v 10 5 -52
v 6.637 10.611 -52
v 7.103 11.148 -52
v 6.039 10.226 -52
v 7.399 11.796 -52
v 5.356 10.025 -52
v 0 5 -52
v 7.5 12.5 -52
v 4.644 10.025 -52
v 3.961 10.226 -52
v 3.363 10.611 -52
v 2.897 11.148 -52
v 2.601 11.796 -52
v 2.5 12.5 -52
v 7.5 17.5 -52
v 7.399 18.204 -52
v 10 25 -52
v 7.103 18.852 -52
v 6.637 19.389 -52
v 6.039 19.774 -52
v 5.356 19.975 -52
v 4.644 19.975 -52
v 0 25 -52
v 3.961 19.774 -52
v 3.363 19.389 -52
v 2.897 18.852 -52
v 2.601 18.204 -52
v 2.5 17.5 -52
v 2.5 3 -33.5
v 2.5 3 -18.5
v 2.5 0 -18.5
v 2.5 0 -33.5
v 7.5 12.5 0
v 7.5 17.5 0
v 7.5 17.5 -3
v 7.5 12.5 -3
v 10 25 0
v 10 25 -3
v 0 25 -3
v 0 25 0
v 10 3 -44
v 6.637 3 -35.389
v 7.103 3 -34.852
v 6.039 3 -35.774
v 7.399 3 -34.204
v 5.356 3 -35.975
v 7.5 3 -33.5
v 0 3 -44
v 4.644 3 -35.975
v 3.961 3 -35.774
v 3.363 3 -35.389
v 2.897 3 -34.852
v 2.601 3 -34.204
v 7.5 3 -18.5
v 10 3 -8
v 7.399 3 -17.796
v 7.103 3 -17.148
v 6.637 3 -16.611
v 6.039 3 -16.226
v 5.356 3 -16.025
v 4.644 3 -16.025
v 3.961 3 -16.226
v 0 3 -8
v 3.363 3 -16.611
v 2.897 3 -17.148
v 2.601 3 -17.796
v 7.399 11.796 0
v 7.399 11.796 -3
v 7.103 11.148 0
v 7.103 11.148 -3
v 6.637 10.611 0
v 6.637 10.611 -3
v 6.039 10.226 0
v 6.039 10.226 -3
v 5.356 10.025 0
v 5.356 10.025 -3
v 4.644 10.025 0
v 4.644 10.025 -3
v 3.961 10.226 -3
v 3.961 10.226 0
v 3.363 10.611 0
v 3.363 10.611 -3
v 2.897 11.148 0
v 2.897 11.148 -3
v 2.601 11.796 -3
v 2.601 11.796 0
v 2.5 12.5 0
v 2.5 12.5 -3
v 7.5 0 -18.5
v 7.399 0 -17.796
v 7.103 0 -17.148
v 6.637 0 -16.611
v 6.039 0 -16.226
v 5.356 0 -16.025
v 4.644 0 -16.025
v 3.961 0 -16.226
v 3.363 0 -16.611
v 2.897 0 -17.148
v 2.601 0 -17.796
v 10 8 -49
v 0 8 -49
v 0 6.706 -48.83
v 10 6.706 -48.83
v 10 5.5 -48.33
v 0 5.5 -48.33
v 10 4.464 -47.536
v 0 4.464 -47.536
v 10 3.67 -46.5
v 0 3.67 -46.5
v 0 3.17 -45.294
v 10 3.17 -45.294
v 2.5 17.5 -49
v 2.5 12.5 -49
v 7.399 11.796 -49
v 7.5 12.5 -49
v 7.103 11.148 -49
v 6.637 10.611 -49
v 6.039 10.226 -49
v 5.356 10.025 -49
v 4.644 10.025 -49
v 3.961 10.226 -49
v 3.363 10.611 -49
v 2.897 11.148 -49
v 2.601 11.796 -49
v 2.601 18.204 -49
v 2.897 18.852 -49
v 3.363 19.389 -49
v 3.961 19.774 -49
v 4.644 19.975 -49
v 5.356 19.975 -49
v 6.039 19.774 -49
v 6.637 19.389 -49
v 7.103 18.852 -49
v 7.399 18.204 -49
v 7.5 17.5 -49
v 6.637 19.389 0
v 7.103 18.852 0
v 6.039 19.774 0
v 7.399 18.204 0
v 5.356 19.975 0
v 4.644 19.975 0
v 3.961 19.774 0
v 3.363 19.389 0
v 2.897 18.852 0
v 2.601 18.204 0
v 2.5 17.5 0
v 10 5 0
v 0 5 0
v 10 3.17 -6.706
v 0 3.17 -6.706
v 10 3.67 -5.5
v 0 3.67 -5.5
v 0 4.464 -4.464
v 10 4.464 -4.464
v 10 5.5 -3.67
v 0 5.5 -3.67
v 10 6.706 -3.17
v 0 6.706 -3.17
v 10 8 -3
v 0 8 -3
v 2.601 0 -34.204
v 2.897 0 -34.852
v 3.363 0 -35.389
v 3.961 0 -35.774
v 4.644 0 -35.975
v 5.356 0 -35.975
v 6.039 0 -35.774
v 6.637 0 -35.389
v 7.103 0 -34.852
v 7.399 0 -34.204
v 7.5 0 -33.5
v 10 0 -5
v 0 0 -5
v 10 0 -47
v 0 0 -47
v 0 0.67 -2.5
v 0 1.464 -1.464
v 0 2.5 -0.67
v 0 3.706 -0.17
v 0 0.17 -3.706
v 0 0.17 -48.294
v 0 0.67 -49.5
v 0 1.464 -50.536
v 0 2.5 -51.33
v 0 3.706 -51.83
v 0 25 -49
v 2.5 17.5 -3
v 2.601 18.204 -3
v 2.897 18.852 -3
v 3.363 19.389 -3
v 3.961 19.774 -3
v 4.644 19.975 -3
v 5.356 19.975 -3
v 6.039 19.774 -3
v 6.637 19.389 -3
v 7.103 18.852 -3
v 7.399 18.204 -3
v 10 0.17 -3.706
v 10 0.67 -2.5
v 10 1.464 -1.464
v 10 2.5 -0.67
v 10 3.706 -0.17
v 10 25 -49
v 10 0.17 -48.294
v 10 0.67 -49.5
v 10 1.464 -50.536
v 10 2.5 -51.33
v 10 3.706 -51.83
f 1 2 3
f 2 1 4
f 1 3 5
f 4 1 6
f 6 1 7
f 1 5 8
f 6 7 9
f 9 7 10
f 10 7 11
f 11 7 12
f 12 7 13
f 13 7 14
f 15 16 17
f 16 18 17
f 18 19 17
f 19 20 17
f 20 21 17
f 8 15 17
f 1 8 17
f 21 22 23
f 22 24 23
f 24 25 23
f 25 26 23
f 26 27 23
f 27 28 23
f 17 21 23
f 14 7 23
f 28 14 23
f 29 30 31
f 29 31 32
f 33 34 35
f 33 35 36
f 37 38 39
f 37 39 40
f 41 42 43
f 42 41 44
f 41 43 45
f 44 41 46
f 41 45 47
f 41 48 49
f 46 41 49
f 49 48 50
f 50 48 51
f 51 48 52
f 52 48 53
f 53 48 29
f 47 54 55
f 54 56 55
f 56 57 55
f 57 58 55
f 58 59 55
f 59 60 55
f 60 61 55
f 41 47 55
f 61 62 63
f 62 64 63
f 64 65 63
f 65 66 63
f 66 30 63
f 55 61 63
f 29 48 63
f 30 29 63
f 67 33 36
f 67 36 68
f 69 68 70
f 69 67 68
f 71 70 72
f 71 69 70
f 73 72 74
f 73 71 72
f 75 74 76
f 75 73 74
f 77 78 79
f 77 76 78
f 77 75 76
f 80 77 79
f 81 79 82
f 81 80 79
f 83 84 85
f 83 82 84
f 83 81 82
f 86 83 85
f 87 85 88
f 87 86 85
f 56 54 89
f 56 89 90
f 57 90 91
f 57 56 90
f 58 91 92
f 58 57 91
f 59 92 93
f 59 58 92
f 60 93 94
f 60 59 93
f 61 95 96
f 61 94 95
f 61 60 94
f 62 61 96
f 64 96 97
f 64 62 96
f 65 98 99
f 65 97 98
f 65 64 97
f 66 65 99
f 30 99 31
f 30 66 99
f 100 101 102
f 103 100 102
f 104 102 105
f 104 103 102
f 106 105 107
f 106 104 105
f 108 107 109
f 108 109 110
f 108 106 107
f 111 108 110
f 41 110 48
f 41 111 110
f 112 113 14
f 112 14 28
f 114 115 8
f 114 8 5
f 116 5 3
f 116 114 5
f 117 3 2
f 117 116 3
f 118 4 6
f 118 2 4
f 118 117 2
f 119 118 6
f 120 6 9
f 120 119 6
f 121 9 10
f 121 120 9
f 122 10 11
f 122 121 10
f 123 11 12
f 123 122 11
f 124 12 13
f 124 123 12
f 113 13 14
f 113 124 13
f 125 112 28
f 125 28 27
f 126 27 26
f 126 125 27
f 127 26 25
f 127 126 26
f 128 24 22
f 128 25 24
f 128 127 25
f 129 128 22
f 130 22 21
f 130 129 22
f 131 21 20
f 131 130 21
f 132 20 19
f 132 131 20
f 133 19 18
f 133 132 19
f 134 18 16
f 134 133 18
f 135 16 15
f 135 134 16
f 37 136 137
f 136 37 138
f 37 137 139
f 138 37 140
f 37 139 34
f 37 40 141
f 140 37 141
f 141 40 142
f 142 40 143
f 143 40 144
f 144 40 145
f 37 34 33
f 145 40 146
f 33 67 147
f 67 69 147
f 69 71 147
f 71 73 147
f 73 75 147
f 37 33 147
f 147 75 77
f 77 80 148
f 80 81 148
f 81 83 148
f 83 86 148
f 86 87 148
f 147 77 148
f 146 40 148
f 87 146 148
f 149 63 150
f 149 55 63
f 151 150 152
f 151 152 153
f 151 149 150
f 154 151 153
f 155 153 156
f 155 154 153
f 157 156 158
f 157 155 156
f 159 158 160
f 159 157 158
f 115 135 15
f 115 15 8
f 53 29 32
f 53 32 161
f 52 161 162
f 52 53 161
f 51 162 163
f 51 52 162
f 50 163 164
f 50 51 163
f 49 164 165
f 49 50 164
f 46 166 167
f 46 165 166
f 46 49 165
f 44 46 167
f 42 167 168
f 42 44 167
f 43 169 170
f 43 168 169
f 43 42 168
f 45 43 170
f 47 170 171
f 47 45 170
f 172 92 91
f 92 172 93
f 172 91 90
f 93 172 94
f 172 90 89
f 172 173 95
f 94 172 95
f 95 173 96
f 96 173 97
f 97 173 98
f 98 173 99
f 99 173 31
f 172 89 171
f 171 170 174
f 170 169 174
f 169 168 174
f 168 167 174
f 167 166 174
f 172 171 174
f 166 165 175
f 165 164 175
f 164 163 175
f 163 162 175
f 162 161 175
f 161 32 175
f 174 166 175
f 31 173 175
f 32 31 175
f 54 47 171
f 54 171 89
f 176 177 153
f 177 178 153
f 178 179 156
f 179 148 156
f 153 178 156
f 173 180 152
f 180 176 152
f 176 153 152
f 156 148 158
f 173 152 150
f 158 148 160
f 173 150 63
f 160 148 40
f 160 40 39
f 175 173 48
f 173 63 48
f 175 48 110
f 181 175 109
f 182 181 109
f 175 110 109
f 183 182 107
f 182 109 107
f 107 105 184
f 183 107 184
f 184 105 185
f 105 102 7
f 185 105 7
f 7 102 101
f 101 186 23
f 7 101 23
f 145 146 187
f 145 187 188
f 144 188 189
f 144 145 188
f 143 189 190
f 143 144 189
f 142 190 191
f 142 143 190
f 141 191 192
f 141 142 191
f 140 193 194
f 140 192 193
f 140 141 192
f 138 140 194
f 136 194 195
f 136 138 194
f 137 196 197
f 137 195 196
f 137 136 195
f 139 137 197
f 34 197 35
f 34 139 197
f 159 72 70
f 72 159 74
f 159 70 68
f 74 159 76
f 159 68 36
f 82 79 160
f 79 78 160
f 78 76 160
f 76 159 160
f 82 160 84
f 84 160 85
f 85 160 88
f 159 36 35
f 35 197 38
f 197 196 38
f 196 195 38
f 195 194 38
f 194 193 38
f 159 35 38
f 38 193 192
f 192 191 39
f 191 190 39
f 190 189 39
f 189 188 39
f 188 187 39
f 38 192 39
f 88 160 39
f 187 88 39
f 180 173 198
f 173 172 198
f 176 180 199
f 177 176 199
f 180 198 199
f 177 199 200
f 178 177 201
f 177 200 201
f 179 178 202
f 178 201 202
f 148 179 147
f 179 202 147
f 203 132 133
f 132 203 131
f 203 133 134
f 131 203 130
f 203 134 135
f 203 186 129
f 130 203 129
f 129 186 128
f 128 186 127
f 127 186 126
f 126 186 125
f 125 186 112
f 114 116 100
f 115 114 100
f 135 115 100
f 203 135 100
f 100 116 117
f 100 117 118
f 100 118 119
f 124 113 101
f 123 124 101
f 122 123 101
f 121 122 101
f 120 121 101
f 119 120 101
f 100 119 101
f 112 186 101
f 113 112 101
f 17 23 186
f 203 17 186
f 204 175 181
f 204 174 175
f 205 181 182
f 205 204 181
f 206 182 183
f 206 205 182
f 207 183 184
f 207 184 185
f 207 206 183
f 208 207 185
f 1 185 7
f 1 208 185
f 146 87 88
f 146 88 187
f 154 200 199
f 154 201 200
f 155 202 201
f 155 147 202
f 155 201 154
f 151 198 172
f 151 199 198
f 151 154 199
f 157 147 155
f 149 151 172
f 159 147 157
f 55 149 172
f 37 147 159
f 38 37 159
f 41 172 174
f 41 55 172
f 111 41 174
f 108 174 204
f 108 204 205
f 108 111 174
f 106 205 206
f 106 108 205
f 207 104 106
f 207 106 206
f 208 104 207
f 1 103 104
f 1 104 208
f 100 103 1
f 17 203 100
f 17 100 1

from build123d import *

# Parameters (mm, degrees)
EXTRUDE_1_DEPTH     = 10
FILLET_1_R          = 5
CUT_EXTRUDE_1_DEPTH = 58.341084747
CUT_EXTRUDE_2_DEPTH = 59.557663888


with BuildPart() as part:
    # 草图1 → 凸台-拉伸1 (new body)
    with BuildSketch(Plane(origin=(0, 0, 0), x_dir=(0, 0, -1), z_dir=(1, 0, 0))):
        Polygon((0, 0), (52, 0), (52, 25), (49, 25), (49, 3), (3, 3), (3, 25), (0, 25), align=None)
    extrude(amount=EXTRUDE_1_DEPTH)

    # 圆角1
    fillet_1_edges = [part.edges().sort_by_distance(p)[0] for p in [
        (5, 3, -3),
        (5, 3, -49),
        (5, 0, -52),
        (5, 0, 0),
    ]]
    fillet(fillet_1_edges, radius=FILLET_1_R)

    # 草图2 → 切除-拉伸1 (cut, through all)
    with BuildSketch(Plane(origin=(0, 3, 0), x_dir=(1, 0, 0), z_dir=(0, 1, 0))):
        with BuildLine():
            Line((7.5, 33.5), (7.5, 18.5))
            ThreePointArc((7.5, 18.5), (5, 16), (2.5, 18.5))
            Line((2.5, 18.5), (2.5, 33.5))
            ThreePointArc((2.5, 33.5), (5, 36), (7.5, 33.5))
        make_face()
    extrude(amount=-CUT_EXTRUDE_1_DEPTH, mode=Mode.SUBTRACT)

    # 草图3 → 切除-拉伸2 (cut, through all)
    with BuildSketch(Plane.XY):
        with BuildLine():
            Line((7.5, 17.5), (7.5, 12.5))
            ThreePointArc((7.5, 12.5), (5, 10), (2.5, 12.5))
            Line((2.5, 12.5), (2.5, 17.5))
            ThreePointArc((2.5, 17.5), (5, 20), (7.5, 17.5))
        make_face()
    extrude(amount=-CUT_EXTRUDE_2_DEPTH, mode=Mode.SUBTRACT)


solid = part.part
